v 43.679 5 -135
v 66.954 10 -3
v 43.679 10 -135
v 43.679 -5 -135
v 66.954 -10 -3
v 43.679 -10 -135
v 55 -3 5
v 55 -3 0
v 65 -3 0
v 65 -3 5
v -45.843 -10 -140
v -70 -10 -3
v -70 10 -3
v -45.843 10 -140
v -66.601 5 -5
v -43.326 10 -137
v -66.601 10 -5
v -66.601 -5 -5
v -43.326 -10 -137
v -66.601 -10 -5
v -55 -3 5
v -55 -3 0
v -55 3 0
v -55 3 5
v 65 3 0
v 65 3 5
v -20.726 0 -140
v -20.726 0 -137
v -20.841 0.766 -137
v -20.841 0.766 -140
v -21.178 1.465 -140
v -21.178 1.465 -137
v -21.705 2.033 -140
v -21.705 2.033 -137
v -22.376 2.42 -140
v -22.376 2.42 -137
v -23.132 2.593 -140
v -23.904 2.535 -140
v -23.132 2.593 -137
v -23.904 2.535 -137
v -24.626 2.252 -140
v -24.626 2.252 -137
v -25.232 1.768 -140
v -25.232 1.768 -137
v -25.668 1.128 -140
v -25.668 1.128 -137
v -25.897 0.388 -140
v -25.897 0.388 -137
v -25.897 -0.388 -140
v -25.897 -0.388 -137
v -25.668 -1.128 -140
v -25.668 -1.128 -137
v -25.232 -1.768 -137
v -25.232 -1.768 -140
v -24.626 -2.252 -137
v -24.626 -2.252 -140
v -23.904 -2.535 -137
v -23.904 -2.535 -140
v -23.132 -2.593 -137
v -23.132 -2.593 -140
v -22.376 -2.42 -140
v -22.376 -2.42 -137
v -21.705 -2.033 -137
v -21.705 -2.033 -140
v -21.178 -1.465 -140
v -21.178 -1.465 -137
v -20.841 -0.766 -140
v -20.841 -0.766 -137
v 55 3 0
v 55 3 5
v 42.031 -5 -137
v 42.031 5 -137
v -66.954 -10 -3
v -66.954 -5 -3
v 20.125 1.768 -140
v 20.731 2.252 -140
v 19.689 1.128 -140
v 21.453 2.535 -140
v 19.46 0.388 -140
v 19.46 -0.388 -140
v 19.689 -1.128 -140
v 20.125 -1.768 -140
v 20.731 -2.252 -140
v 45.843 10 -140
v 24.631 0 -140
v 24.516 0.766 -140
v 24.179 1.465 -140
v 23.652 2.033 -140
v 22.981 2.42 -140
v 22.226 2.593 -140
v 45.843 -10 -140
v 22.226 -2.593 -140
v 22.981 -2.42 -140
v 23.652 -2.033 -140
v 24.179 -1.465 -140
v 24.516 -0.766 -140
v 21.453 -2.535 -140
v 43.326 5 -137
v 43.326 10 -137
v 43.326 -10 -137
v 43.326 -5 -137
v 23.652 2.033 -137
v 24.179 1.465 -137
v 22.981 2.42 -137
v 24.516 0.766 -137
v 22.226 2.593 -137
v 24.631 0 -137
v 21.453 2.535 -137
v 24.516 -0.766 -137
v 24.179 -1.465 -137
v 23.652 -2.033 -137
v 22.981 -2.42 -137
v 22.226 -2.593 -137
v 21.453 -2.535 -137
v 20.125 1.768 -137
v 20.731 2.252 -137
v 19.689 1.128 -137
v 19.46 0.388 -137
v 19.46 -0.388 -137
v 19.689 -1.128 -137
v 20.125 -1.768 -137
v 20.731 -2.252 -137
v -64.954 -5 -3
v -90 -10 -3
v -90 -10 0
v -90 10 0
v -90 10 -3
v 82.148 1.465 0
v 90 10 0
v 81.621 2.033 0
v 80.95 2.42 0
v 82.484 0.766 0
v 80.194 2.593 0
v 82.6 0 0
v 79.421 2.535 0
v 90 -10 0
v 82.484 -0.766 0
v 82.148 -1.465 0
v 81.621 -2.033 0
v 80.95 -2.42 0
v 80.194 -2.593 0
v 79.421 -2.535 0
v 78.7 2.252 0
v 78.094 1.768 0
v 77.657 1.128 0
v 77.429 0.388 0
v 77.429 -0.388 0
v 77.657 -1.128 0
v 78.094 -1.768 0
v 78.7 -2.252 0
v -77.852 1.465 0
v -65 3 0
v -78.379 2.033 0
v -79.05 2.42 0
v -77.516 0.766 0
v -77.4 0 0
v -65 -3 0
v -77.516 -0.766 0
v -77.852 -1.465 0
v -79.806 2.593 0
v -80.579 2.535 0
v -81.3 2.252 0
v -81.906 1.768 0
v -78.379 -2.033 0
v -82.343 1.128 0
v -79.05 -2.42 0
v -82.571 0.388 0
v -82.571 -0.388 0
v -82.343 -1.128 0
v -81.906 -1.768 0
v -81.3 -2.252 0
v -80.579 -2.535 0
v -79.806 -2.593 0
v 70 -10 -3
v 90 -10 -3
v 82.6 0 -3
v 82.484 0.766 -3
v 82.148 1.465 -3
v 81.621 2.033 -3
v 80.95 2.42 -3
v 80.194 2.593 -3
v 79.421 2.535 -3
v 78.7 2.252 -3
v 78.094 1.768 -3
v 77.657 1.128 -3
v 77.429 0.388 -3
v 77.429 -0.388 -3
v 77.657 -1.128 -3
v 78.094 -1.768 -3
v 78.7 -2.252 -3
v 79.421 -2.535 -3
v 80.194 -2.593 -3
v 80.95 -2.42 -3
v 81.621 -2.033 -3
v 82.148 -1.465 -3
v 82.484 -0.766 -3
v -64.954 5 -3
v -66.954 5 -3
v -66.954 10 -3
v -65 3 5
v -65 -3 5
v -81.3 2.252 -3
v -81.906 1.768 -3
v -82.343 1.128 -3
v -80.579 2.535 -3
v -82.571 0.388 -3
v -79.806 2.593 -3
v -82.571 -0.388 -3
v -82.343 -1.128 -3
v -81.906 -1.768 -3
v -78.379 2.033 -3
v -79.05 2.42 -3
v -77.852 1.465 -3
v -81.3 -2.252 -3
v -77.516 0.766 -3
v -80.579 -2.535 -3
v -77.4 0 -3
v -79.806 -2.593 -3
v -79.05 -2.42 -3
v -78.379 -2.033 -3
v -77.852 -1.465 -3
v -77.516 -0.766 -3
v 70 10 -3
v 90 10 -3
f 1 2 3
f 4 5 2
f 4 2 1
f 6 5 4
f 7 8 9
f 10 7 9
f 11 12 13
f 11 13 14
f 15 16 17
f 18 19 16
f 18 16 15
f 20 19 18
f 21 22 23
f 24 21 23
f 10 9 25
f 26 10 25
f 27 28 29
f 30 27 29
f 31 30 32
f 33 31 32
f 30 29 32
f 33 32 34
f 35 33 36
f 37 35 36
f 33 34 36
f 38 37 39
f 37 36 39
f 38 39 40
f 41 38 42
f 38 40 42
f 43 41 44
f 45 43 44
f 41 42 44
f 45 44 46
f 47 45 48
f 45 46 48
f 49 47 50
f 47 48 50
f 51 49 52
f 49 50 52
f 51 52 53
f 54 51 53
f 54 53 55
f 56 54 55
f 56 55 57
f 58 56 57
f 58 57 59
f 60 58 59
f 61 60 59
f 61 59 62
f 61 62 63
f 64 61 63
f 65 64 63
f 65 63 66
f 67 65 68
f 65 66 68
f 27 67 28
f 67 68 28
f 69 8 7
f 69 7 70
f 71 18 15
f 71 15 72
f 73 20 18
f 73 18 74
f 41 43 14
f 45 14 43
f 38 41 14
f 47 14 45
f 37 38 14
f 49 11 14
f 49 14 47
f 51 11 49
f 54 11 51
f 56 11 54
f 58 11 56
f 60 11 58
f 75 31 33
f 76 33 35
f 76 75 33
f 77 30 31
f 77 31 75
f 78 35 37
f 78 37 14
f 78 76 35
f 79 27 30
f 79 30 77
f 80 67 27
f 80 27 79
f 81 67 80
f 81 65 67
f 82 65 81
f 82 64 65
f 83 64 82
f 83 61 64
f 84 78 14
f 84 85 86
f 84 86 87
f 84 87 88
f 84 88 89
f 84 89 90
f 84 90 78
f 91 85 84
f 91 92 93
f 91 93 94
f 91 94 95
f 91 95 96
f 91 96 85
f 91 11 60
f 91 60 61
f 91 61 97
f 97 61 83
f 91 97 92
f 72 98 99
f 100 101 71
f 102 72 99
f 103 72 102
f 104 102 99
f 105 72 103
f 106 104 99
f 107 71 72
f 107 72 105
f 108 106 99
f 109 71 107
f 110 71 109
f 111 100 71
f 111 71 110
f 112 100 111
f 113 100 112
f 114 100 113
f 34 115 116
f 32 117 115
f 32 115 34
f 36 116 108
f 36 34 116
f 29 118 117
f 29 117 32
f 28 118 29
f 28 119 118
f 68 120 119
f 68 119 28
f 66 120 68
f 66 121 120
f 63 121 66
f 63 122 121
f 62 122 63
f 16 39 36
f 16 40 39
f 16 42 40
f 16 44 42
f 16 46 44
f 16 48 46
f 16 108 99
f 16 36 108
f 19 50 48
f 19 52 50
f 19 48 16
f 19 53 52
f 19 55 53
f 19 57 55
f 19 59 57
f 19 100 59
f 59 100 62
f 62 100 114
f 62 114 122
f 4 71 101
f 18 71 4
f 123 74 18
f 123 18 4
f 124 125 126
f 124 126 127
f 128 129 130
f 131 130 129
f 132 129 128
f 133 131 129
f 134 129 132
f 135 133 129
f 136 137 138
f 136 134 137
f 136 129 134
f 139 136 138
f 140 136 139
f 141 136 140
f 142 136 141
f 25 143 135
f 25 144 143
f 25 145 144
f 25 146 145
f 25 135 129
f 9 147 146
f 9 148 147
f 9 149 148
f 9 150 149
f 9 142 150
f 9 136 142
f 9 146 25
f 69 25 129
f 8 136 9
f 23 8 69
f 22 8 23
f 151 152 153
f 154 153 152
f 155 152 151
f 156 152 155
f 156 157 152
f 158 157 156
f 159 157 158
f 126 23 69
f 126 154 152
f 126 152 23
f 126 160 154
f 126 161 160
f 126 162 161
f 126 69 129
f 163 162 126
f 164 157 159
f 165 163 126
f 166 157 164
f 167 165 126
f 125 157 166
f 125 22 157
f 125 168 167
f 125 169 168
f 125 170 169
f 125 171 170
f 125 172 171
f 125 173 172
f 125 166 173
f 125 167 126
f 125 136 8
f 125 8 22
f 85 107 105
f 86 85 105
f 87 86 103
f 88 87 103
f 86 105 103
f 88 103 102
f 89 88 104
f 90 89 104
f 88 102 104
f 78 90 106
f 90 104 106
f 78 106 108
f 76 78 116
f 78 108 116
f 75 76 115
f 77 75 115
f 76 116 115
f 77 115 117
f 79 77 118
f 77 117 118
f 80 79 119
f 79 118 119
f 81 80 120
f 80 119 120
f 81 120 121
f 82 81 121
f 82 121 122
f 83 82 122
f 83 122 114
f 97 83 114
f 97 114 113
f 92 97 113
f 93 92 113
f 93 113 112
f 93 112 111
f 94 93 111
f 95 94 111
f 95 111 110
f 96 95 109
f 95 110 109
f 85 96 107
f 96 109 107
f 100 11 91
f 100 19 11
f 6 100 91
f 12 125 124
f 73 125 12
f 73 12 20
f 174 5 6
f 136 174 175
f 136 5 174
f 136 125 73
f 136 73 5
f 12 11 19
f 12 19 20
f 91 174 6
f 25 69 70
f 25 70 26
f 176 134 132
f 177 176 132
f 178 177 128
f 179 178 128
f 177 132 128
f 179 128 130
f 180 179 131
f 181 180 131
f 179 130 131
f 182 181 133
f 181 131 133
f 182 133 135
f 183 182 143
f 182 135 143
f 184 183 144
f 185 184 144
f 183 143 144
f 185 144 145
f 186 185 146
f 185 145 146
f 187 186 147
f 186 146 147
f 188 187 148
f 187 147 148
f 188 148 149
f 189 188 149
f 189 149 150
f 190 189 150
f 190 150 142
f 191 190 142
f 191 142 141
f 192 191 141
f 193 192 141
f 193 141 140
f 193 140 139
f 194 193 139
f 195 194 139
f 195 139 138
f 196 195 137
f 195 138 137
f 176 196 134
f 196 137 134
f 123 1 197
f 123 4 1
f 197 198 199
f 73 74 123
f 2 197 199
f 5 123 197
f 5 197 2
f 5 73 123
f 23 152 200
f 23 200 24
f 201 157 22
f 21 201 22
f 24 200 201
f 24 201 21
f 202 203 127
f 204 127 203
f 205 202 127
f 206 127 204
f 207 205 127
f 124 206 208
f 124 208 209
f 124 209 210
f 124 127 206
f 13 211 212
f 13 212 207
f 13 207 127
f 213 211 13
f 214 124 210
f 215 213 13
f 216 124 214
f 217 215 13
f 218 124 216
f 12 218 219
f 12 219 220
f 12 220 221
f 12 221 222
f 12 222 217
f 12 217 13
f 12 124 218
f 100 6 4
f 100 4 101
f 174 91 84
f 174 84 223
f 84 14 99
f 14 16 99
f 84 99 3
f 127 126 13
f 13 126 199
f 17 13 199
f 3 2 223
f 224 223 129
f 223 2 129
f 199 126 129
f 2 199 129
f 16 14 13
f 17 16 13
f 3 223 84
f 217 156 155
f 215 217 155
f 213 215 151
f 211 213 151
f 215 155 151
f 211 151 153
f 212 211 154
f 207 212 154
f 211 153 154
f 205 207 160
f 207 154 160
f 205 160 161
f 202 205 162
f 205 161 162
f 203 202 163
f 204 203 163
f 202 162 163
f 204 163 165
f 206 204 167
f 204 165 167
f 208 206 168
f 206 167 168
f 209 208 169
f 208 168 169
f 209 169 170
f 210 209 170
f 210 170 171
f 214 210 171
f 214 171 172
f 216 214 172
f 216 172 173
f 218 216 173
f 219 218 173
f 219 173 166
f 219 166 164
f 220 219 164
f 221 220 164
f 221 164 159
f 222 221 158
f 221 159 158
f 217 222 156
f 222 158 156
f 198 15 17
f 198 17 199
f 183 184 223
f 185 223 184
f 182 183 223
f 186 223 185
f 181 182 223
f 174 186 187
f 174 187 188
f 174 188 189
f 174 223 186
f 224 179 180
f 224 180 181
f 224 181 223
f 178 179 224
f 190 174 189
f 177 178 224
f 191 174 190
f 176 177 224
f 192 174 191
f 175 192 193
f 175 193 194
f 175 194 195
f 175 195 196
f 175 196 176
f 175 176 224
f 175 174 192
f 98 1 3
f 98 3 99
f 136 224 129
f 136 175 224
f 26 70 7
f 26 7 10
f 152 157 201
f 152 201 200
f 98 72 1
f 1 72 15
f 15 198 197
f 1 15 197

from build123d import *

# Parameters (mm, degrees)
F1_DEPTH = 10
F2_W     = 10
F2_H     = 6
F3_DEPTH = 5
F2_R     = 2.6
F4_DEPTH = 3
F5_R     = 2.6
F6_DEPTH = 3
F7_DEPTH = 5


with BuildPart() as f1:
    # F0 (on Front) → F1 (new body, symmetric)
    with BuildSketch(Plane.XZ):
        Polygon((90, 0), (-90, 0), (-90, -3), (-70, -3), (-45.843204, -140), (45.843204, -140), (70, -3), (90, -3), align=None)
        Polygon((-66.601066, -5), (-66.95372, -3), (-64.95372, -3), (66.95372, -3), (43.678559, -135), (43.325905, -137), (42.031213, -137), (-43.325905, -137), align=None, mode=Mode.SUBTRACT)
    extrude(amount=F1_DEPTH, both=True)

    # F2 (on face) → F3 (join)
    with BuildSketch(Plane.XY):
        with Locations((-60, 0)):
            Rectangle(F2_W, F2_H)
        with Locations((60, 0)):
            Rectangle(F2_W, F2_H)
    extrude(amount=F3_DEPTH)

    # F2 (on face) → F4 (cut, through all)
    with BuildSketch(Plane.XY):
        with Locations((-80, 0)):
            Circle(F2_R)
        with Locations((80, 0)):
            Circle(F2_R)
    extrude(amount=-F4_DEPTH, mode=Mode.SUBTRACT)

    # F5 (on face) → F6 (cut, through all)
    with BuildSketch(Plane.XY.offset(-137)):
        with Locations((-23.325905, 0)):
            Circle(F5_R)
        with Locations((22.031213, 0)):
            Circle(F5_R)
    extrude(amount=-F6_DEPTH, mode=Mode.SUBTRACT)

    # F0 (on Front) → F7 (join, symmetric)
    with BuildSketch(Plane.XZ):
        Polygon((-64.95372, -3), (-66.95372, -3), (-66.601066, -5), (42.031213, -137), (43.325905, -137), (43.678559, -135), align=None)
    extrude(amount=F7_DEPTH, both=True)


solid = f1.part
